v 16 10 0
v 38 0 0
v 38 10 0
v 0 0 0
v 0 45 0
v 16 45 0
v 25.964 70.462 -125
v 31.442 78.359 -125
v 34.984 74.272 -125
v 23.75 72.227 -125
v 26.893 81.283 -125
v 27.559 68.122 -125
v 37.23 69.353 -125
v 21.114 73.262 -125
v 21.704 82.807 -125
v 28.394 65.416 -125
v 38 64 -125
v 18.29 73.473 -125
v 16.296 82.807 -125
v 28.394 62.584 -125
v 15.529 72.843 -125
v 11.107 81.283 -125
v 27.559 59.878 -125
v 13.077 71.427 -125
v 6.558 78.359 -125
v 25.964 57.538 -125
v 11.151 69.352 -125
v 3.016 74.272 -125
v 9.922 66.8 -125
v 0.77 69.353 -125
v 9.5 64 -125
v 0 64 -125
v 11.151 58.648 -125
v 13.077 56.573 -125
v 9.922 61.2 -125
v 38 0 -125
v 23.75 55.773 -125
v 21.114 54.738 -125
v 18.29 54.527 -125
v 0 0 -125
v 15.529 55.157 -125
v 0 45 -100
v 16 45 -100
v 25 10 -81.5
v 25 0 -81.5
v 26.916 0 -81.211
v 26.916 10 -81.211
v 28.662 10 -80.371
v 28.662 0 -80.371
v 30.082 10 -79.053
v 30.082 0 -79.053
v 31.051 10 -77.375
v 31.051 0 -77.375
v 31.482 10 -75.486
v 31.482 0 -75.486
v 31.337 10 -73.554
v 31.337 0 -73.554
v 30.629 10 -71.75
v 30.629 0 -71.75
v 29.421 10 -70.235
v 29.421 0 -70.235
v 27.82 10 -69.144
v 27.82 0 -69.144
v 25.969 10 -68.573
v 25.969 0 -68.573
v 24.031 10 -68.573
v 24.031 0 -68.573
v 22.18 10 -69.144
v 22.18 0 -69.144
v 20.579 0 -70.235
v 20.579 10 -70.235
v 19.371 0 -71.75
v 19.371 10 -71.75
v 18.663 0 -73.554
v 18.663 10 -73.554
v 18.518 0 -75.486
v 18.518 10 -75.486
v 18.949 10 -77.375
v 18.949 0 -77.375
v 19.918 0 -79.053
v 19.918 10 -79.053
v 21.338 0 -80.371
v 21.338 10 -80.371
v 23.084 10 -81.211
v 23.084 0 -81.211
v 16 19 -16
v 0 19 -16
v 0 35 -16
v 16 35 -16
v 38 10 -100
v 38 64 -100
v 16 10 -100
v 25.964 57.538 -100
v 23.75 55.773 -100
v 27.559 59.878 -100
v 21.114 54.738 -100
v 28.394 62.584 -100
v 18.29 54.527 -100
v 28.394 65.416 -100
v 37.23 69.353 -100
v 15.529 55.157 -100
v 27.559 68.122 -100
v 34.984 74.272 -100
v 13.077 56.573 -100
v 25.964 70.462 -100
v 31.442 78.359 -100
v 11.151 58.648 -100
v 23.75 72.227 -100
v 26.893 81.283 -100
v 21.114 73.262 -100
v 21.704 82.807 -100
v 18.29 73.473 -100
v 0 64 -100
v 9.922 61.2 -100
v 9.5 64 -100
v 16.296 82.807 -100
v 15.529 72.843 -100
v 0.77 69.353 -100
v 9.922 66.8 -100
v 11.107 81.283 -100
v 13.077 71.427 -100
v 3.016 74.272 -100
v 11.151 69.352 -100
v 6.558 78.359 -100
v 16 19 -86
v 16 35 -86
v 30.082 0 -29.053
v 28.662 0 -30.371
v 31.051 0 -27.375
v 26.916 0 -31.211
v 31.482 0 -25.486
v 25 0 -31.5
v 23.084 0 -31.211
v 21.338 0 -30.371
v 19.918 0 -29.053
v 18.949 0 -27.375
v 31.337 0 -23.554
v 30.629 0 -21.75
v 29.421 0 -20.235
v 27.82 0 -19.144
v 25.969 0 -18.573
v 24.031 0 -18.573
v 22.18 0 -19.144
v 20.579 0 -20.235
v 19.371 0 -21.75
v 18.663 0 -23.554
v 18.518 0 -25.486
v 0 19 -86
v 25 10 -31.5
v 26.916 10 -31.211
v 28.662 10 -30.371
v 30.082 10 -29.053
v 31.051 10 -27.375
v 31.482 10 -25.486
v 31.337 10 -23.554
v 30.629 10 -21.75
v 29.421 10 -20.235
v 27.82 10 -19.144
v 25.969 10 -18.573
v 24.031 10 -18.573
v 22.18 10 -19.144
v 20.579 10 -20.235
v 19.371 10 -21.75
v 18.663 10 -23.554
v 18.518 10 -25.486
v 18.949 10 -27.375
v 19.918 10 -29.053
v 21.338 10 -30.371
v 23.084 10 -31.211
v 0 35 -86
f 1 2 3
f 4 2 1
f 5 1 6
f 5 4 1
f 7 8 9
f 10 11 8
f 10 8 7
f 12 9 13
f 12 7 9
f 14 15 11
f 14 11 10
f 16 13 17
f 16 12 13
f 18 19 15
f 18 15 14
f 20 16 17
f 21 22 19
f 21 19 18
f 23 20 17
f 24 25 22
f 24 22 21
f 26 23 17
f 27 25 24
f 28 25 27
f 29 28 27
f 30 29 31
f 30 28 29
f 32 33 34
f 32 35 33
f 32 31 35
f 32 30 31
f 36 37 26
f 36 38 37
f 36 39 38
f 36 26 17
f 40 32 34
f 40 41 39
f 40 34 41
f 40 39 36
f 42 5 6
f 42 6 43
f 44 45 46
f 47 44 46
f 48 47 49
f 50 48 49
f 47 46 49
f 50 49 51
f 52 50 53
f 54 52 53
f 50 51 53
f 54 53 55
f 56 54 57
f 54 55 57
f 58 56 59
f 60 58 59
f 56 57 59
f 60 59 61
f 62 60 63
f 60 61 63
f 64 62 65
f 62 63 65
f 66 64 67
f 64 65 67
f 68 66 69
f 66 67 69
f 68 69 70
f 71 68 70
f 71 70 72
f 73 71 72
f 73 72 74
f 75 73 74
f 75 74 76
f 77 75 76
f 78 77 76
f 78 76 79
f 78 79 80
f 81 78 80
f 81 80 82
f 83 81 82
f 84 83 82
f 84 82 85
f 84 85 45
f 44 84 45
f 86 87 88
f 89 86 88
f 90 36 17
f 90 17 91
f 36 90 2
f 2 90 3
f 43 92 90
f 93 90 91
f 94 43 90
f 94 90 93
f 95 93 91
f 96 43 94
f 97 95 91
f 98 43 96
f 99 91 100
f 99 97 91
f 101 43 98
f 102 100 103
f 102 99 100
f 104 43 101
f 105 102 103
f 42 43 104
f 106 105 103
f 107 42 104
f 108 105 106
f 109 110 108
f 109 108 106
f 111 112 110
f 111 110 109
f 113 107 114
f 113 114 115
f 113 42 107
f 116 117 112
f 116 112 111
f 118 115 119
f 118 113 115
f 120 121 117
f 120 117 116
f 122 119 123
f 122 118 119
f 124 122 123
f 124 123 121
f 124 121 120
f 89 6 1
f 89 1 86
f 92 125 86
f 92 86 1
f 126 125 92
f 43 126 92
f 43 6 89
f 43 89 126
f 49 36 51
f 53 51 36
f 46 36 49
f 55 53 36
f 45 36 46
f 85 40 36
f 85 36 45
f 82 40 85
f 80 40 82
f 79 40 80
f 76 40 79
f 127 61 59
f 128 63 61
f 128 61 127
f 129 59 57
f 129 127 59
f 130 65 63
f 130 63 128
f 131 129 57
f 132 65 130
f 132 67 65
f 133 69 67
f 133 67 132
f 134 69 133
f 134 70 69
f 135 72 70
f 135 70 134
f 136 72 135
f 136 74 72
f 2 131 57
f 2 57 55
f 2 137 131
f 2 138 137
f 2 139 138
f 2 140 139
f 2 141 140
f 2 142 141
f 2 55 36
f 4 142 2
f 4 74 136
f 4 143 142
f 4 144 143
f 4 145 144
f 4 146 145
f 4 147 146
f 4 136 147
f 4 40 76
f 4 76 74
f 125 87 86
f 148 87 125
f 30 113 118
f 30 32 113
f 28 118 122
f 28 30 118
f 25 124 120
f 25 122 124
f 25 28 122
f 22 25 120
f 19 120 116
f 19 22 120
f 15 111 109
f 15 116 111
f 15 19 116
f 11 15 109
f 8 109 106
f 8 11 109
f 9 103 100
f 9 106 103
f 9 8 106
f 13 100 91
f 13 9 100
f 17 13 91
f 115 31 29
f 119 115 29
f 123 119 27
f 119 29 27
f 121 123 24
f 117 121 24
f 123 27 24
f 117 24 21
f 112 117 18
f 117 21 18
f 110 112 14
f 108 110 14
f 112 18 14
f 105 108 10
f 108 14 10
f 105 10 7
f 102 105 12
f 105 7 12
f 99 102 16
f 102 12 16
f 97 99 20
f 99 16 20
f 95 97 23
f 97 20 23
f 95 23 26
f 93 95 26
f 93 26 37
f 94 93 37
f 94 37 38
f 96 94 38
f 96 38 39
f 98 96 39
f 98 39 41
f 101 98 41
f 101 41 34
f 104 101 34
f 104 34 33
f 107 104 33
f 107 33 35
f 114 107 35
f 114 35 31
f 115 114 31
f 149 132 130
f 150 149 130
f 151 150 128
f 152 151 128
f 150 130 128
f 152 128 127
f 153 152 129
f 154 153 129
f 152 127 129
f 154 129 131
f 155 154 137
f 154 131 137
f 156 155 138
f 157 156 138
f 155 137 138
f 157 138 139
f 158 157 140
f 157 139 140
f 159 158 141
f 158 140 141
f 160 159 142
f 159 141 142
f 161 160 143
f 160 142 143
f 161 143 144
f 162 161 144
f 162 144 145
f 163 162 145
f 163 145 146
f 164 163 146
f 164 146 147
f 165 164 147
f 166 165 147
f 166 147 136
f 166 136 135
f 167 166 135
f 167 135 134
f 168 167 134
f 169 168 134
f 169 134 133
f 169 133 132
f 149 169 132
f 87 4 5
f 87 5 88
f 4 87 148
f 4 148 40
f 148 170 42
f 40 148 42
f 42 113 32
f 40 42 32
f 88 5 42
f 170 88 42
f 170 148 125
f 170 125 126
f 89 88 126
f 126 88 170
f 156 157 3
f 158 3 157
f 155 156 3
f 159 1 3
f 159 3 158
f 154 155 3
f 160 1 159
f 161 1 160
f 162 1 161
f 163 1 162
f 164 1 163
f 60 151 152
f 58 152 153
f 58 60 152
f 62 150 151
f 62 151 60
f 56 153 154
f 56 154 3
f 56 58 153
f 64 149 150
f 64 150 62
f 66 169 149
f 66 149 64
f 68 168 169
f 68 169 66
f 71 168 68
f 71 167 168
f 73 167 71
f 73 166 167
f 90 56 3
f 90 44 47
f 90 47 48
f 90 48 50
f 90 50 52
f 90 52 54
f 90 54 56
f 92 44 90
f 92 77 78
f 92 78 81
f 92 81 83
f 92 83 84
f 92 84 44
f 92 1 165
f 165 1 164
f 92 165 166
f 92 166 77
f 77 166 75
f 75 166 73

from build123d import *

# Parameters (mm, degrees)
BOSS_EXTRUDE1_DEPTH        = 38
SKETCH1_3_W                = 100
SKETCH1_3_H                = 35
SKETCH1_3_W_2              = 70
SKETCH1_3_H_2              = 16
BOSS_EXTRUDE2_DEPTH        = 16
FILLET1_RADIUS             = 19
FILLET1_LENGTH             = 25
F_19_0_19_DIAMETER_HOLE1_D = 19
F_13_0_13_DIAMETER_HOLE1_D = 13


with BuildPart() as part:
    # Sketch1 → Boss-Extrude1 (new body)
    with BuildSketch(Plane(origin=(0, 0, 0), x_dir=(0, 0, -1), z_dir=(1, 0, 0))):
        Polygon((100, 10), (100, 83), (125, 83), (125, 0), (0, 0), (0, 10), align=None)
    extrude(amount=BOSS_EXTRUDE1_DEPTH)

    # Sketch1<3> → Boss-Extrude2 (add)
    with BuildSketch(Plane(origin=(0, 0, 0), x_dir=(0, 0, -1), z_dir=(1, 0, 0))):
        with Locations((50, 27.5)):
            Rectangle(SKETCH1_3_W, SKETCH1_3_H)
        with Locations((51, 27)):
            Rectangle(SKETCH1_3_W_2, SKETCH1_3_H_2, mode=Mode.SUBTRACT)
    extrude(amount=BOSS_EXTRUDE2_DEPTH)

    # Fillet1: full round fillet: the end face becomes a half cylinder, R = half its width
    fillet1_face = Plane((19, 83, -112.5), x_dir=(0, 0, -1), z_dir=(0, 1, 0))  # on the end face: x along it, z out of the body
    fillet1_slab = fillet1_face.offset(-FILLET1_RADIUS / 2) * Box(FILLET1_LENGTH, 2 * FILLET1_RADIUS, FILLET1_RADIUS, mode=Mode.PRIVATE)  # the body's end, R deep
    fillet1_round = Plane((19, 64, -112.5), x_dir=(0, 1, 0), z_dir=(0, 0, -1)) * Cylinder(FILLET1_RADIUS, FILLET1_LENGTH, mode=Mode.PRIVATE)  # its axis R under the face
    add(fillet1_slab - fillet1_round, mode=Mode.SUBTRACT)

    # Ø19.0 (19) Diameter Hole1 (through all)
    with Locations(Plane(origin=(19, 64, -100), x_dir=(1, 0, 0), z_dir=(0, 0, 1))):
        with Locations((0, 0)):
            Hole(F_19_0_19_DIAMETER_HOLE1_D / 2)

    # Ø13.0 (13) Diameter Hole1 (through all)
    with Locations(Plane(origin=(25, 10, -25), x_dir=(0, 0, 1), z_dir=(0, 1, 0))):
        with Locations((0, 0), (-50, 0)):
            Hole(F_13_0_13_DIAMETER_HOLE1_D / 2)


solid = part.part
